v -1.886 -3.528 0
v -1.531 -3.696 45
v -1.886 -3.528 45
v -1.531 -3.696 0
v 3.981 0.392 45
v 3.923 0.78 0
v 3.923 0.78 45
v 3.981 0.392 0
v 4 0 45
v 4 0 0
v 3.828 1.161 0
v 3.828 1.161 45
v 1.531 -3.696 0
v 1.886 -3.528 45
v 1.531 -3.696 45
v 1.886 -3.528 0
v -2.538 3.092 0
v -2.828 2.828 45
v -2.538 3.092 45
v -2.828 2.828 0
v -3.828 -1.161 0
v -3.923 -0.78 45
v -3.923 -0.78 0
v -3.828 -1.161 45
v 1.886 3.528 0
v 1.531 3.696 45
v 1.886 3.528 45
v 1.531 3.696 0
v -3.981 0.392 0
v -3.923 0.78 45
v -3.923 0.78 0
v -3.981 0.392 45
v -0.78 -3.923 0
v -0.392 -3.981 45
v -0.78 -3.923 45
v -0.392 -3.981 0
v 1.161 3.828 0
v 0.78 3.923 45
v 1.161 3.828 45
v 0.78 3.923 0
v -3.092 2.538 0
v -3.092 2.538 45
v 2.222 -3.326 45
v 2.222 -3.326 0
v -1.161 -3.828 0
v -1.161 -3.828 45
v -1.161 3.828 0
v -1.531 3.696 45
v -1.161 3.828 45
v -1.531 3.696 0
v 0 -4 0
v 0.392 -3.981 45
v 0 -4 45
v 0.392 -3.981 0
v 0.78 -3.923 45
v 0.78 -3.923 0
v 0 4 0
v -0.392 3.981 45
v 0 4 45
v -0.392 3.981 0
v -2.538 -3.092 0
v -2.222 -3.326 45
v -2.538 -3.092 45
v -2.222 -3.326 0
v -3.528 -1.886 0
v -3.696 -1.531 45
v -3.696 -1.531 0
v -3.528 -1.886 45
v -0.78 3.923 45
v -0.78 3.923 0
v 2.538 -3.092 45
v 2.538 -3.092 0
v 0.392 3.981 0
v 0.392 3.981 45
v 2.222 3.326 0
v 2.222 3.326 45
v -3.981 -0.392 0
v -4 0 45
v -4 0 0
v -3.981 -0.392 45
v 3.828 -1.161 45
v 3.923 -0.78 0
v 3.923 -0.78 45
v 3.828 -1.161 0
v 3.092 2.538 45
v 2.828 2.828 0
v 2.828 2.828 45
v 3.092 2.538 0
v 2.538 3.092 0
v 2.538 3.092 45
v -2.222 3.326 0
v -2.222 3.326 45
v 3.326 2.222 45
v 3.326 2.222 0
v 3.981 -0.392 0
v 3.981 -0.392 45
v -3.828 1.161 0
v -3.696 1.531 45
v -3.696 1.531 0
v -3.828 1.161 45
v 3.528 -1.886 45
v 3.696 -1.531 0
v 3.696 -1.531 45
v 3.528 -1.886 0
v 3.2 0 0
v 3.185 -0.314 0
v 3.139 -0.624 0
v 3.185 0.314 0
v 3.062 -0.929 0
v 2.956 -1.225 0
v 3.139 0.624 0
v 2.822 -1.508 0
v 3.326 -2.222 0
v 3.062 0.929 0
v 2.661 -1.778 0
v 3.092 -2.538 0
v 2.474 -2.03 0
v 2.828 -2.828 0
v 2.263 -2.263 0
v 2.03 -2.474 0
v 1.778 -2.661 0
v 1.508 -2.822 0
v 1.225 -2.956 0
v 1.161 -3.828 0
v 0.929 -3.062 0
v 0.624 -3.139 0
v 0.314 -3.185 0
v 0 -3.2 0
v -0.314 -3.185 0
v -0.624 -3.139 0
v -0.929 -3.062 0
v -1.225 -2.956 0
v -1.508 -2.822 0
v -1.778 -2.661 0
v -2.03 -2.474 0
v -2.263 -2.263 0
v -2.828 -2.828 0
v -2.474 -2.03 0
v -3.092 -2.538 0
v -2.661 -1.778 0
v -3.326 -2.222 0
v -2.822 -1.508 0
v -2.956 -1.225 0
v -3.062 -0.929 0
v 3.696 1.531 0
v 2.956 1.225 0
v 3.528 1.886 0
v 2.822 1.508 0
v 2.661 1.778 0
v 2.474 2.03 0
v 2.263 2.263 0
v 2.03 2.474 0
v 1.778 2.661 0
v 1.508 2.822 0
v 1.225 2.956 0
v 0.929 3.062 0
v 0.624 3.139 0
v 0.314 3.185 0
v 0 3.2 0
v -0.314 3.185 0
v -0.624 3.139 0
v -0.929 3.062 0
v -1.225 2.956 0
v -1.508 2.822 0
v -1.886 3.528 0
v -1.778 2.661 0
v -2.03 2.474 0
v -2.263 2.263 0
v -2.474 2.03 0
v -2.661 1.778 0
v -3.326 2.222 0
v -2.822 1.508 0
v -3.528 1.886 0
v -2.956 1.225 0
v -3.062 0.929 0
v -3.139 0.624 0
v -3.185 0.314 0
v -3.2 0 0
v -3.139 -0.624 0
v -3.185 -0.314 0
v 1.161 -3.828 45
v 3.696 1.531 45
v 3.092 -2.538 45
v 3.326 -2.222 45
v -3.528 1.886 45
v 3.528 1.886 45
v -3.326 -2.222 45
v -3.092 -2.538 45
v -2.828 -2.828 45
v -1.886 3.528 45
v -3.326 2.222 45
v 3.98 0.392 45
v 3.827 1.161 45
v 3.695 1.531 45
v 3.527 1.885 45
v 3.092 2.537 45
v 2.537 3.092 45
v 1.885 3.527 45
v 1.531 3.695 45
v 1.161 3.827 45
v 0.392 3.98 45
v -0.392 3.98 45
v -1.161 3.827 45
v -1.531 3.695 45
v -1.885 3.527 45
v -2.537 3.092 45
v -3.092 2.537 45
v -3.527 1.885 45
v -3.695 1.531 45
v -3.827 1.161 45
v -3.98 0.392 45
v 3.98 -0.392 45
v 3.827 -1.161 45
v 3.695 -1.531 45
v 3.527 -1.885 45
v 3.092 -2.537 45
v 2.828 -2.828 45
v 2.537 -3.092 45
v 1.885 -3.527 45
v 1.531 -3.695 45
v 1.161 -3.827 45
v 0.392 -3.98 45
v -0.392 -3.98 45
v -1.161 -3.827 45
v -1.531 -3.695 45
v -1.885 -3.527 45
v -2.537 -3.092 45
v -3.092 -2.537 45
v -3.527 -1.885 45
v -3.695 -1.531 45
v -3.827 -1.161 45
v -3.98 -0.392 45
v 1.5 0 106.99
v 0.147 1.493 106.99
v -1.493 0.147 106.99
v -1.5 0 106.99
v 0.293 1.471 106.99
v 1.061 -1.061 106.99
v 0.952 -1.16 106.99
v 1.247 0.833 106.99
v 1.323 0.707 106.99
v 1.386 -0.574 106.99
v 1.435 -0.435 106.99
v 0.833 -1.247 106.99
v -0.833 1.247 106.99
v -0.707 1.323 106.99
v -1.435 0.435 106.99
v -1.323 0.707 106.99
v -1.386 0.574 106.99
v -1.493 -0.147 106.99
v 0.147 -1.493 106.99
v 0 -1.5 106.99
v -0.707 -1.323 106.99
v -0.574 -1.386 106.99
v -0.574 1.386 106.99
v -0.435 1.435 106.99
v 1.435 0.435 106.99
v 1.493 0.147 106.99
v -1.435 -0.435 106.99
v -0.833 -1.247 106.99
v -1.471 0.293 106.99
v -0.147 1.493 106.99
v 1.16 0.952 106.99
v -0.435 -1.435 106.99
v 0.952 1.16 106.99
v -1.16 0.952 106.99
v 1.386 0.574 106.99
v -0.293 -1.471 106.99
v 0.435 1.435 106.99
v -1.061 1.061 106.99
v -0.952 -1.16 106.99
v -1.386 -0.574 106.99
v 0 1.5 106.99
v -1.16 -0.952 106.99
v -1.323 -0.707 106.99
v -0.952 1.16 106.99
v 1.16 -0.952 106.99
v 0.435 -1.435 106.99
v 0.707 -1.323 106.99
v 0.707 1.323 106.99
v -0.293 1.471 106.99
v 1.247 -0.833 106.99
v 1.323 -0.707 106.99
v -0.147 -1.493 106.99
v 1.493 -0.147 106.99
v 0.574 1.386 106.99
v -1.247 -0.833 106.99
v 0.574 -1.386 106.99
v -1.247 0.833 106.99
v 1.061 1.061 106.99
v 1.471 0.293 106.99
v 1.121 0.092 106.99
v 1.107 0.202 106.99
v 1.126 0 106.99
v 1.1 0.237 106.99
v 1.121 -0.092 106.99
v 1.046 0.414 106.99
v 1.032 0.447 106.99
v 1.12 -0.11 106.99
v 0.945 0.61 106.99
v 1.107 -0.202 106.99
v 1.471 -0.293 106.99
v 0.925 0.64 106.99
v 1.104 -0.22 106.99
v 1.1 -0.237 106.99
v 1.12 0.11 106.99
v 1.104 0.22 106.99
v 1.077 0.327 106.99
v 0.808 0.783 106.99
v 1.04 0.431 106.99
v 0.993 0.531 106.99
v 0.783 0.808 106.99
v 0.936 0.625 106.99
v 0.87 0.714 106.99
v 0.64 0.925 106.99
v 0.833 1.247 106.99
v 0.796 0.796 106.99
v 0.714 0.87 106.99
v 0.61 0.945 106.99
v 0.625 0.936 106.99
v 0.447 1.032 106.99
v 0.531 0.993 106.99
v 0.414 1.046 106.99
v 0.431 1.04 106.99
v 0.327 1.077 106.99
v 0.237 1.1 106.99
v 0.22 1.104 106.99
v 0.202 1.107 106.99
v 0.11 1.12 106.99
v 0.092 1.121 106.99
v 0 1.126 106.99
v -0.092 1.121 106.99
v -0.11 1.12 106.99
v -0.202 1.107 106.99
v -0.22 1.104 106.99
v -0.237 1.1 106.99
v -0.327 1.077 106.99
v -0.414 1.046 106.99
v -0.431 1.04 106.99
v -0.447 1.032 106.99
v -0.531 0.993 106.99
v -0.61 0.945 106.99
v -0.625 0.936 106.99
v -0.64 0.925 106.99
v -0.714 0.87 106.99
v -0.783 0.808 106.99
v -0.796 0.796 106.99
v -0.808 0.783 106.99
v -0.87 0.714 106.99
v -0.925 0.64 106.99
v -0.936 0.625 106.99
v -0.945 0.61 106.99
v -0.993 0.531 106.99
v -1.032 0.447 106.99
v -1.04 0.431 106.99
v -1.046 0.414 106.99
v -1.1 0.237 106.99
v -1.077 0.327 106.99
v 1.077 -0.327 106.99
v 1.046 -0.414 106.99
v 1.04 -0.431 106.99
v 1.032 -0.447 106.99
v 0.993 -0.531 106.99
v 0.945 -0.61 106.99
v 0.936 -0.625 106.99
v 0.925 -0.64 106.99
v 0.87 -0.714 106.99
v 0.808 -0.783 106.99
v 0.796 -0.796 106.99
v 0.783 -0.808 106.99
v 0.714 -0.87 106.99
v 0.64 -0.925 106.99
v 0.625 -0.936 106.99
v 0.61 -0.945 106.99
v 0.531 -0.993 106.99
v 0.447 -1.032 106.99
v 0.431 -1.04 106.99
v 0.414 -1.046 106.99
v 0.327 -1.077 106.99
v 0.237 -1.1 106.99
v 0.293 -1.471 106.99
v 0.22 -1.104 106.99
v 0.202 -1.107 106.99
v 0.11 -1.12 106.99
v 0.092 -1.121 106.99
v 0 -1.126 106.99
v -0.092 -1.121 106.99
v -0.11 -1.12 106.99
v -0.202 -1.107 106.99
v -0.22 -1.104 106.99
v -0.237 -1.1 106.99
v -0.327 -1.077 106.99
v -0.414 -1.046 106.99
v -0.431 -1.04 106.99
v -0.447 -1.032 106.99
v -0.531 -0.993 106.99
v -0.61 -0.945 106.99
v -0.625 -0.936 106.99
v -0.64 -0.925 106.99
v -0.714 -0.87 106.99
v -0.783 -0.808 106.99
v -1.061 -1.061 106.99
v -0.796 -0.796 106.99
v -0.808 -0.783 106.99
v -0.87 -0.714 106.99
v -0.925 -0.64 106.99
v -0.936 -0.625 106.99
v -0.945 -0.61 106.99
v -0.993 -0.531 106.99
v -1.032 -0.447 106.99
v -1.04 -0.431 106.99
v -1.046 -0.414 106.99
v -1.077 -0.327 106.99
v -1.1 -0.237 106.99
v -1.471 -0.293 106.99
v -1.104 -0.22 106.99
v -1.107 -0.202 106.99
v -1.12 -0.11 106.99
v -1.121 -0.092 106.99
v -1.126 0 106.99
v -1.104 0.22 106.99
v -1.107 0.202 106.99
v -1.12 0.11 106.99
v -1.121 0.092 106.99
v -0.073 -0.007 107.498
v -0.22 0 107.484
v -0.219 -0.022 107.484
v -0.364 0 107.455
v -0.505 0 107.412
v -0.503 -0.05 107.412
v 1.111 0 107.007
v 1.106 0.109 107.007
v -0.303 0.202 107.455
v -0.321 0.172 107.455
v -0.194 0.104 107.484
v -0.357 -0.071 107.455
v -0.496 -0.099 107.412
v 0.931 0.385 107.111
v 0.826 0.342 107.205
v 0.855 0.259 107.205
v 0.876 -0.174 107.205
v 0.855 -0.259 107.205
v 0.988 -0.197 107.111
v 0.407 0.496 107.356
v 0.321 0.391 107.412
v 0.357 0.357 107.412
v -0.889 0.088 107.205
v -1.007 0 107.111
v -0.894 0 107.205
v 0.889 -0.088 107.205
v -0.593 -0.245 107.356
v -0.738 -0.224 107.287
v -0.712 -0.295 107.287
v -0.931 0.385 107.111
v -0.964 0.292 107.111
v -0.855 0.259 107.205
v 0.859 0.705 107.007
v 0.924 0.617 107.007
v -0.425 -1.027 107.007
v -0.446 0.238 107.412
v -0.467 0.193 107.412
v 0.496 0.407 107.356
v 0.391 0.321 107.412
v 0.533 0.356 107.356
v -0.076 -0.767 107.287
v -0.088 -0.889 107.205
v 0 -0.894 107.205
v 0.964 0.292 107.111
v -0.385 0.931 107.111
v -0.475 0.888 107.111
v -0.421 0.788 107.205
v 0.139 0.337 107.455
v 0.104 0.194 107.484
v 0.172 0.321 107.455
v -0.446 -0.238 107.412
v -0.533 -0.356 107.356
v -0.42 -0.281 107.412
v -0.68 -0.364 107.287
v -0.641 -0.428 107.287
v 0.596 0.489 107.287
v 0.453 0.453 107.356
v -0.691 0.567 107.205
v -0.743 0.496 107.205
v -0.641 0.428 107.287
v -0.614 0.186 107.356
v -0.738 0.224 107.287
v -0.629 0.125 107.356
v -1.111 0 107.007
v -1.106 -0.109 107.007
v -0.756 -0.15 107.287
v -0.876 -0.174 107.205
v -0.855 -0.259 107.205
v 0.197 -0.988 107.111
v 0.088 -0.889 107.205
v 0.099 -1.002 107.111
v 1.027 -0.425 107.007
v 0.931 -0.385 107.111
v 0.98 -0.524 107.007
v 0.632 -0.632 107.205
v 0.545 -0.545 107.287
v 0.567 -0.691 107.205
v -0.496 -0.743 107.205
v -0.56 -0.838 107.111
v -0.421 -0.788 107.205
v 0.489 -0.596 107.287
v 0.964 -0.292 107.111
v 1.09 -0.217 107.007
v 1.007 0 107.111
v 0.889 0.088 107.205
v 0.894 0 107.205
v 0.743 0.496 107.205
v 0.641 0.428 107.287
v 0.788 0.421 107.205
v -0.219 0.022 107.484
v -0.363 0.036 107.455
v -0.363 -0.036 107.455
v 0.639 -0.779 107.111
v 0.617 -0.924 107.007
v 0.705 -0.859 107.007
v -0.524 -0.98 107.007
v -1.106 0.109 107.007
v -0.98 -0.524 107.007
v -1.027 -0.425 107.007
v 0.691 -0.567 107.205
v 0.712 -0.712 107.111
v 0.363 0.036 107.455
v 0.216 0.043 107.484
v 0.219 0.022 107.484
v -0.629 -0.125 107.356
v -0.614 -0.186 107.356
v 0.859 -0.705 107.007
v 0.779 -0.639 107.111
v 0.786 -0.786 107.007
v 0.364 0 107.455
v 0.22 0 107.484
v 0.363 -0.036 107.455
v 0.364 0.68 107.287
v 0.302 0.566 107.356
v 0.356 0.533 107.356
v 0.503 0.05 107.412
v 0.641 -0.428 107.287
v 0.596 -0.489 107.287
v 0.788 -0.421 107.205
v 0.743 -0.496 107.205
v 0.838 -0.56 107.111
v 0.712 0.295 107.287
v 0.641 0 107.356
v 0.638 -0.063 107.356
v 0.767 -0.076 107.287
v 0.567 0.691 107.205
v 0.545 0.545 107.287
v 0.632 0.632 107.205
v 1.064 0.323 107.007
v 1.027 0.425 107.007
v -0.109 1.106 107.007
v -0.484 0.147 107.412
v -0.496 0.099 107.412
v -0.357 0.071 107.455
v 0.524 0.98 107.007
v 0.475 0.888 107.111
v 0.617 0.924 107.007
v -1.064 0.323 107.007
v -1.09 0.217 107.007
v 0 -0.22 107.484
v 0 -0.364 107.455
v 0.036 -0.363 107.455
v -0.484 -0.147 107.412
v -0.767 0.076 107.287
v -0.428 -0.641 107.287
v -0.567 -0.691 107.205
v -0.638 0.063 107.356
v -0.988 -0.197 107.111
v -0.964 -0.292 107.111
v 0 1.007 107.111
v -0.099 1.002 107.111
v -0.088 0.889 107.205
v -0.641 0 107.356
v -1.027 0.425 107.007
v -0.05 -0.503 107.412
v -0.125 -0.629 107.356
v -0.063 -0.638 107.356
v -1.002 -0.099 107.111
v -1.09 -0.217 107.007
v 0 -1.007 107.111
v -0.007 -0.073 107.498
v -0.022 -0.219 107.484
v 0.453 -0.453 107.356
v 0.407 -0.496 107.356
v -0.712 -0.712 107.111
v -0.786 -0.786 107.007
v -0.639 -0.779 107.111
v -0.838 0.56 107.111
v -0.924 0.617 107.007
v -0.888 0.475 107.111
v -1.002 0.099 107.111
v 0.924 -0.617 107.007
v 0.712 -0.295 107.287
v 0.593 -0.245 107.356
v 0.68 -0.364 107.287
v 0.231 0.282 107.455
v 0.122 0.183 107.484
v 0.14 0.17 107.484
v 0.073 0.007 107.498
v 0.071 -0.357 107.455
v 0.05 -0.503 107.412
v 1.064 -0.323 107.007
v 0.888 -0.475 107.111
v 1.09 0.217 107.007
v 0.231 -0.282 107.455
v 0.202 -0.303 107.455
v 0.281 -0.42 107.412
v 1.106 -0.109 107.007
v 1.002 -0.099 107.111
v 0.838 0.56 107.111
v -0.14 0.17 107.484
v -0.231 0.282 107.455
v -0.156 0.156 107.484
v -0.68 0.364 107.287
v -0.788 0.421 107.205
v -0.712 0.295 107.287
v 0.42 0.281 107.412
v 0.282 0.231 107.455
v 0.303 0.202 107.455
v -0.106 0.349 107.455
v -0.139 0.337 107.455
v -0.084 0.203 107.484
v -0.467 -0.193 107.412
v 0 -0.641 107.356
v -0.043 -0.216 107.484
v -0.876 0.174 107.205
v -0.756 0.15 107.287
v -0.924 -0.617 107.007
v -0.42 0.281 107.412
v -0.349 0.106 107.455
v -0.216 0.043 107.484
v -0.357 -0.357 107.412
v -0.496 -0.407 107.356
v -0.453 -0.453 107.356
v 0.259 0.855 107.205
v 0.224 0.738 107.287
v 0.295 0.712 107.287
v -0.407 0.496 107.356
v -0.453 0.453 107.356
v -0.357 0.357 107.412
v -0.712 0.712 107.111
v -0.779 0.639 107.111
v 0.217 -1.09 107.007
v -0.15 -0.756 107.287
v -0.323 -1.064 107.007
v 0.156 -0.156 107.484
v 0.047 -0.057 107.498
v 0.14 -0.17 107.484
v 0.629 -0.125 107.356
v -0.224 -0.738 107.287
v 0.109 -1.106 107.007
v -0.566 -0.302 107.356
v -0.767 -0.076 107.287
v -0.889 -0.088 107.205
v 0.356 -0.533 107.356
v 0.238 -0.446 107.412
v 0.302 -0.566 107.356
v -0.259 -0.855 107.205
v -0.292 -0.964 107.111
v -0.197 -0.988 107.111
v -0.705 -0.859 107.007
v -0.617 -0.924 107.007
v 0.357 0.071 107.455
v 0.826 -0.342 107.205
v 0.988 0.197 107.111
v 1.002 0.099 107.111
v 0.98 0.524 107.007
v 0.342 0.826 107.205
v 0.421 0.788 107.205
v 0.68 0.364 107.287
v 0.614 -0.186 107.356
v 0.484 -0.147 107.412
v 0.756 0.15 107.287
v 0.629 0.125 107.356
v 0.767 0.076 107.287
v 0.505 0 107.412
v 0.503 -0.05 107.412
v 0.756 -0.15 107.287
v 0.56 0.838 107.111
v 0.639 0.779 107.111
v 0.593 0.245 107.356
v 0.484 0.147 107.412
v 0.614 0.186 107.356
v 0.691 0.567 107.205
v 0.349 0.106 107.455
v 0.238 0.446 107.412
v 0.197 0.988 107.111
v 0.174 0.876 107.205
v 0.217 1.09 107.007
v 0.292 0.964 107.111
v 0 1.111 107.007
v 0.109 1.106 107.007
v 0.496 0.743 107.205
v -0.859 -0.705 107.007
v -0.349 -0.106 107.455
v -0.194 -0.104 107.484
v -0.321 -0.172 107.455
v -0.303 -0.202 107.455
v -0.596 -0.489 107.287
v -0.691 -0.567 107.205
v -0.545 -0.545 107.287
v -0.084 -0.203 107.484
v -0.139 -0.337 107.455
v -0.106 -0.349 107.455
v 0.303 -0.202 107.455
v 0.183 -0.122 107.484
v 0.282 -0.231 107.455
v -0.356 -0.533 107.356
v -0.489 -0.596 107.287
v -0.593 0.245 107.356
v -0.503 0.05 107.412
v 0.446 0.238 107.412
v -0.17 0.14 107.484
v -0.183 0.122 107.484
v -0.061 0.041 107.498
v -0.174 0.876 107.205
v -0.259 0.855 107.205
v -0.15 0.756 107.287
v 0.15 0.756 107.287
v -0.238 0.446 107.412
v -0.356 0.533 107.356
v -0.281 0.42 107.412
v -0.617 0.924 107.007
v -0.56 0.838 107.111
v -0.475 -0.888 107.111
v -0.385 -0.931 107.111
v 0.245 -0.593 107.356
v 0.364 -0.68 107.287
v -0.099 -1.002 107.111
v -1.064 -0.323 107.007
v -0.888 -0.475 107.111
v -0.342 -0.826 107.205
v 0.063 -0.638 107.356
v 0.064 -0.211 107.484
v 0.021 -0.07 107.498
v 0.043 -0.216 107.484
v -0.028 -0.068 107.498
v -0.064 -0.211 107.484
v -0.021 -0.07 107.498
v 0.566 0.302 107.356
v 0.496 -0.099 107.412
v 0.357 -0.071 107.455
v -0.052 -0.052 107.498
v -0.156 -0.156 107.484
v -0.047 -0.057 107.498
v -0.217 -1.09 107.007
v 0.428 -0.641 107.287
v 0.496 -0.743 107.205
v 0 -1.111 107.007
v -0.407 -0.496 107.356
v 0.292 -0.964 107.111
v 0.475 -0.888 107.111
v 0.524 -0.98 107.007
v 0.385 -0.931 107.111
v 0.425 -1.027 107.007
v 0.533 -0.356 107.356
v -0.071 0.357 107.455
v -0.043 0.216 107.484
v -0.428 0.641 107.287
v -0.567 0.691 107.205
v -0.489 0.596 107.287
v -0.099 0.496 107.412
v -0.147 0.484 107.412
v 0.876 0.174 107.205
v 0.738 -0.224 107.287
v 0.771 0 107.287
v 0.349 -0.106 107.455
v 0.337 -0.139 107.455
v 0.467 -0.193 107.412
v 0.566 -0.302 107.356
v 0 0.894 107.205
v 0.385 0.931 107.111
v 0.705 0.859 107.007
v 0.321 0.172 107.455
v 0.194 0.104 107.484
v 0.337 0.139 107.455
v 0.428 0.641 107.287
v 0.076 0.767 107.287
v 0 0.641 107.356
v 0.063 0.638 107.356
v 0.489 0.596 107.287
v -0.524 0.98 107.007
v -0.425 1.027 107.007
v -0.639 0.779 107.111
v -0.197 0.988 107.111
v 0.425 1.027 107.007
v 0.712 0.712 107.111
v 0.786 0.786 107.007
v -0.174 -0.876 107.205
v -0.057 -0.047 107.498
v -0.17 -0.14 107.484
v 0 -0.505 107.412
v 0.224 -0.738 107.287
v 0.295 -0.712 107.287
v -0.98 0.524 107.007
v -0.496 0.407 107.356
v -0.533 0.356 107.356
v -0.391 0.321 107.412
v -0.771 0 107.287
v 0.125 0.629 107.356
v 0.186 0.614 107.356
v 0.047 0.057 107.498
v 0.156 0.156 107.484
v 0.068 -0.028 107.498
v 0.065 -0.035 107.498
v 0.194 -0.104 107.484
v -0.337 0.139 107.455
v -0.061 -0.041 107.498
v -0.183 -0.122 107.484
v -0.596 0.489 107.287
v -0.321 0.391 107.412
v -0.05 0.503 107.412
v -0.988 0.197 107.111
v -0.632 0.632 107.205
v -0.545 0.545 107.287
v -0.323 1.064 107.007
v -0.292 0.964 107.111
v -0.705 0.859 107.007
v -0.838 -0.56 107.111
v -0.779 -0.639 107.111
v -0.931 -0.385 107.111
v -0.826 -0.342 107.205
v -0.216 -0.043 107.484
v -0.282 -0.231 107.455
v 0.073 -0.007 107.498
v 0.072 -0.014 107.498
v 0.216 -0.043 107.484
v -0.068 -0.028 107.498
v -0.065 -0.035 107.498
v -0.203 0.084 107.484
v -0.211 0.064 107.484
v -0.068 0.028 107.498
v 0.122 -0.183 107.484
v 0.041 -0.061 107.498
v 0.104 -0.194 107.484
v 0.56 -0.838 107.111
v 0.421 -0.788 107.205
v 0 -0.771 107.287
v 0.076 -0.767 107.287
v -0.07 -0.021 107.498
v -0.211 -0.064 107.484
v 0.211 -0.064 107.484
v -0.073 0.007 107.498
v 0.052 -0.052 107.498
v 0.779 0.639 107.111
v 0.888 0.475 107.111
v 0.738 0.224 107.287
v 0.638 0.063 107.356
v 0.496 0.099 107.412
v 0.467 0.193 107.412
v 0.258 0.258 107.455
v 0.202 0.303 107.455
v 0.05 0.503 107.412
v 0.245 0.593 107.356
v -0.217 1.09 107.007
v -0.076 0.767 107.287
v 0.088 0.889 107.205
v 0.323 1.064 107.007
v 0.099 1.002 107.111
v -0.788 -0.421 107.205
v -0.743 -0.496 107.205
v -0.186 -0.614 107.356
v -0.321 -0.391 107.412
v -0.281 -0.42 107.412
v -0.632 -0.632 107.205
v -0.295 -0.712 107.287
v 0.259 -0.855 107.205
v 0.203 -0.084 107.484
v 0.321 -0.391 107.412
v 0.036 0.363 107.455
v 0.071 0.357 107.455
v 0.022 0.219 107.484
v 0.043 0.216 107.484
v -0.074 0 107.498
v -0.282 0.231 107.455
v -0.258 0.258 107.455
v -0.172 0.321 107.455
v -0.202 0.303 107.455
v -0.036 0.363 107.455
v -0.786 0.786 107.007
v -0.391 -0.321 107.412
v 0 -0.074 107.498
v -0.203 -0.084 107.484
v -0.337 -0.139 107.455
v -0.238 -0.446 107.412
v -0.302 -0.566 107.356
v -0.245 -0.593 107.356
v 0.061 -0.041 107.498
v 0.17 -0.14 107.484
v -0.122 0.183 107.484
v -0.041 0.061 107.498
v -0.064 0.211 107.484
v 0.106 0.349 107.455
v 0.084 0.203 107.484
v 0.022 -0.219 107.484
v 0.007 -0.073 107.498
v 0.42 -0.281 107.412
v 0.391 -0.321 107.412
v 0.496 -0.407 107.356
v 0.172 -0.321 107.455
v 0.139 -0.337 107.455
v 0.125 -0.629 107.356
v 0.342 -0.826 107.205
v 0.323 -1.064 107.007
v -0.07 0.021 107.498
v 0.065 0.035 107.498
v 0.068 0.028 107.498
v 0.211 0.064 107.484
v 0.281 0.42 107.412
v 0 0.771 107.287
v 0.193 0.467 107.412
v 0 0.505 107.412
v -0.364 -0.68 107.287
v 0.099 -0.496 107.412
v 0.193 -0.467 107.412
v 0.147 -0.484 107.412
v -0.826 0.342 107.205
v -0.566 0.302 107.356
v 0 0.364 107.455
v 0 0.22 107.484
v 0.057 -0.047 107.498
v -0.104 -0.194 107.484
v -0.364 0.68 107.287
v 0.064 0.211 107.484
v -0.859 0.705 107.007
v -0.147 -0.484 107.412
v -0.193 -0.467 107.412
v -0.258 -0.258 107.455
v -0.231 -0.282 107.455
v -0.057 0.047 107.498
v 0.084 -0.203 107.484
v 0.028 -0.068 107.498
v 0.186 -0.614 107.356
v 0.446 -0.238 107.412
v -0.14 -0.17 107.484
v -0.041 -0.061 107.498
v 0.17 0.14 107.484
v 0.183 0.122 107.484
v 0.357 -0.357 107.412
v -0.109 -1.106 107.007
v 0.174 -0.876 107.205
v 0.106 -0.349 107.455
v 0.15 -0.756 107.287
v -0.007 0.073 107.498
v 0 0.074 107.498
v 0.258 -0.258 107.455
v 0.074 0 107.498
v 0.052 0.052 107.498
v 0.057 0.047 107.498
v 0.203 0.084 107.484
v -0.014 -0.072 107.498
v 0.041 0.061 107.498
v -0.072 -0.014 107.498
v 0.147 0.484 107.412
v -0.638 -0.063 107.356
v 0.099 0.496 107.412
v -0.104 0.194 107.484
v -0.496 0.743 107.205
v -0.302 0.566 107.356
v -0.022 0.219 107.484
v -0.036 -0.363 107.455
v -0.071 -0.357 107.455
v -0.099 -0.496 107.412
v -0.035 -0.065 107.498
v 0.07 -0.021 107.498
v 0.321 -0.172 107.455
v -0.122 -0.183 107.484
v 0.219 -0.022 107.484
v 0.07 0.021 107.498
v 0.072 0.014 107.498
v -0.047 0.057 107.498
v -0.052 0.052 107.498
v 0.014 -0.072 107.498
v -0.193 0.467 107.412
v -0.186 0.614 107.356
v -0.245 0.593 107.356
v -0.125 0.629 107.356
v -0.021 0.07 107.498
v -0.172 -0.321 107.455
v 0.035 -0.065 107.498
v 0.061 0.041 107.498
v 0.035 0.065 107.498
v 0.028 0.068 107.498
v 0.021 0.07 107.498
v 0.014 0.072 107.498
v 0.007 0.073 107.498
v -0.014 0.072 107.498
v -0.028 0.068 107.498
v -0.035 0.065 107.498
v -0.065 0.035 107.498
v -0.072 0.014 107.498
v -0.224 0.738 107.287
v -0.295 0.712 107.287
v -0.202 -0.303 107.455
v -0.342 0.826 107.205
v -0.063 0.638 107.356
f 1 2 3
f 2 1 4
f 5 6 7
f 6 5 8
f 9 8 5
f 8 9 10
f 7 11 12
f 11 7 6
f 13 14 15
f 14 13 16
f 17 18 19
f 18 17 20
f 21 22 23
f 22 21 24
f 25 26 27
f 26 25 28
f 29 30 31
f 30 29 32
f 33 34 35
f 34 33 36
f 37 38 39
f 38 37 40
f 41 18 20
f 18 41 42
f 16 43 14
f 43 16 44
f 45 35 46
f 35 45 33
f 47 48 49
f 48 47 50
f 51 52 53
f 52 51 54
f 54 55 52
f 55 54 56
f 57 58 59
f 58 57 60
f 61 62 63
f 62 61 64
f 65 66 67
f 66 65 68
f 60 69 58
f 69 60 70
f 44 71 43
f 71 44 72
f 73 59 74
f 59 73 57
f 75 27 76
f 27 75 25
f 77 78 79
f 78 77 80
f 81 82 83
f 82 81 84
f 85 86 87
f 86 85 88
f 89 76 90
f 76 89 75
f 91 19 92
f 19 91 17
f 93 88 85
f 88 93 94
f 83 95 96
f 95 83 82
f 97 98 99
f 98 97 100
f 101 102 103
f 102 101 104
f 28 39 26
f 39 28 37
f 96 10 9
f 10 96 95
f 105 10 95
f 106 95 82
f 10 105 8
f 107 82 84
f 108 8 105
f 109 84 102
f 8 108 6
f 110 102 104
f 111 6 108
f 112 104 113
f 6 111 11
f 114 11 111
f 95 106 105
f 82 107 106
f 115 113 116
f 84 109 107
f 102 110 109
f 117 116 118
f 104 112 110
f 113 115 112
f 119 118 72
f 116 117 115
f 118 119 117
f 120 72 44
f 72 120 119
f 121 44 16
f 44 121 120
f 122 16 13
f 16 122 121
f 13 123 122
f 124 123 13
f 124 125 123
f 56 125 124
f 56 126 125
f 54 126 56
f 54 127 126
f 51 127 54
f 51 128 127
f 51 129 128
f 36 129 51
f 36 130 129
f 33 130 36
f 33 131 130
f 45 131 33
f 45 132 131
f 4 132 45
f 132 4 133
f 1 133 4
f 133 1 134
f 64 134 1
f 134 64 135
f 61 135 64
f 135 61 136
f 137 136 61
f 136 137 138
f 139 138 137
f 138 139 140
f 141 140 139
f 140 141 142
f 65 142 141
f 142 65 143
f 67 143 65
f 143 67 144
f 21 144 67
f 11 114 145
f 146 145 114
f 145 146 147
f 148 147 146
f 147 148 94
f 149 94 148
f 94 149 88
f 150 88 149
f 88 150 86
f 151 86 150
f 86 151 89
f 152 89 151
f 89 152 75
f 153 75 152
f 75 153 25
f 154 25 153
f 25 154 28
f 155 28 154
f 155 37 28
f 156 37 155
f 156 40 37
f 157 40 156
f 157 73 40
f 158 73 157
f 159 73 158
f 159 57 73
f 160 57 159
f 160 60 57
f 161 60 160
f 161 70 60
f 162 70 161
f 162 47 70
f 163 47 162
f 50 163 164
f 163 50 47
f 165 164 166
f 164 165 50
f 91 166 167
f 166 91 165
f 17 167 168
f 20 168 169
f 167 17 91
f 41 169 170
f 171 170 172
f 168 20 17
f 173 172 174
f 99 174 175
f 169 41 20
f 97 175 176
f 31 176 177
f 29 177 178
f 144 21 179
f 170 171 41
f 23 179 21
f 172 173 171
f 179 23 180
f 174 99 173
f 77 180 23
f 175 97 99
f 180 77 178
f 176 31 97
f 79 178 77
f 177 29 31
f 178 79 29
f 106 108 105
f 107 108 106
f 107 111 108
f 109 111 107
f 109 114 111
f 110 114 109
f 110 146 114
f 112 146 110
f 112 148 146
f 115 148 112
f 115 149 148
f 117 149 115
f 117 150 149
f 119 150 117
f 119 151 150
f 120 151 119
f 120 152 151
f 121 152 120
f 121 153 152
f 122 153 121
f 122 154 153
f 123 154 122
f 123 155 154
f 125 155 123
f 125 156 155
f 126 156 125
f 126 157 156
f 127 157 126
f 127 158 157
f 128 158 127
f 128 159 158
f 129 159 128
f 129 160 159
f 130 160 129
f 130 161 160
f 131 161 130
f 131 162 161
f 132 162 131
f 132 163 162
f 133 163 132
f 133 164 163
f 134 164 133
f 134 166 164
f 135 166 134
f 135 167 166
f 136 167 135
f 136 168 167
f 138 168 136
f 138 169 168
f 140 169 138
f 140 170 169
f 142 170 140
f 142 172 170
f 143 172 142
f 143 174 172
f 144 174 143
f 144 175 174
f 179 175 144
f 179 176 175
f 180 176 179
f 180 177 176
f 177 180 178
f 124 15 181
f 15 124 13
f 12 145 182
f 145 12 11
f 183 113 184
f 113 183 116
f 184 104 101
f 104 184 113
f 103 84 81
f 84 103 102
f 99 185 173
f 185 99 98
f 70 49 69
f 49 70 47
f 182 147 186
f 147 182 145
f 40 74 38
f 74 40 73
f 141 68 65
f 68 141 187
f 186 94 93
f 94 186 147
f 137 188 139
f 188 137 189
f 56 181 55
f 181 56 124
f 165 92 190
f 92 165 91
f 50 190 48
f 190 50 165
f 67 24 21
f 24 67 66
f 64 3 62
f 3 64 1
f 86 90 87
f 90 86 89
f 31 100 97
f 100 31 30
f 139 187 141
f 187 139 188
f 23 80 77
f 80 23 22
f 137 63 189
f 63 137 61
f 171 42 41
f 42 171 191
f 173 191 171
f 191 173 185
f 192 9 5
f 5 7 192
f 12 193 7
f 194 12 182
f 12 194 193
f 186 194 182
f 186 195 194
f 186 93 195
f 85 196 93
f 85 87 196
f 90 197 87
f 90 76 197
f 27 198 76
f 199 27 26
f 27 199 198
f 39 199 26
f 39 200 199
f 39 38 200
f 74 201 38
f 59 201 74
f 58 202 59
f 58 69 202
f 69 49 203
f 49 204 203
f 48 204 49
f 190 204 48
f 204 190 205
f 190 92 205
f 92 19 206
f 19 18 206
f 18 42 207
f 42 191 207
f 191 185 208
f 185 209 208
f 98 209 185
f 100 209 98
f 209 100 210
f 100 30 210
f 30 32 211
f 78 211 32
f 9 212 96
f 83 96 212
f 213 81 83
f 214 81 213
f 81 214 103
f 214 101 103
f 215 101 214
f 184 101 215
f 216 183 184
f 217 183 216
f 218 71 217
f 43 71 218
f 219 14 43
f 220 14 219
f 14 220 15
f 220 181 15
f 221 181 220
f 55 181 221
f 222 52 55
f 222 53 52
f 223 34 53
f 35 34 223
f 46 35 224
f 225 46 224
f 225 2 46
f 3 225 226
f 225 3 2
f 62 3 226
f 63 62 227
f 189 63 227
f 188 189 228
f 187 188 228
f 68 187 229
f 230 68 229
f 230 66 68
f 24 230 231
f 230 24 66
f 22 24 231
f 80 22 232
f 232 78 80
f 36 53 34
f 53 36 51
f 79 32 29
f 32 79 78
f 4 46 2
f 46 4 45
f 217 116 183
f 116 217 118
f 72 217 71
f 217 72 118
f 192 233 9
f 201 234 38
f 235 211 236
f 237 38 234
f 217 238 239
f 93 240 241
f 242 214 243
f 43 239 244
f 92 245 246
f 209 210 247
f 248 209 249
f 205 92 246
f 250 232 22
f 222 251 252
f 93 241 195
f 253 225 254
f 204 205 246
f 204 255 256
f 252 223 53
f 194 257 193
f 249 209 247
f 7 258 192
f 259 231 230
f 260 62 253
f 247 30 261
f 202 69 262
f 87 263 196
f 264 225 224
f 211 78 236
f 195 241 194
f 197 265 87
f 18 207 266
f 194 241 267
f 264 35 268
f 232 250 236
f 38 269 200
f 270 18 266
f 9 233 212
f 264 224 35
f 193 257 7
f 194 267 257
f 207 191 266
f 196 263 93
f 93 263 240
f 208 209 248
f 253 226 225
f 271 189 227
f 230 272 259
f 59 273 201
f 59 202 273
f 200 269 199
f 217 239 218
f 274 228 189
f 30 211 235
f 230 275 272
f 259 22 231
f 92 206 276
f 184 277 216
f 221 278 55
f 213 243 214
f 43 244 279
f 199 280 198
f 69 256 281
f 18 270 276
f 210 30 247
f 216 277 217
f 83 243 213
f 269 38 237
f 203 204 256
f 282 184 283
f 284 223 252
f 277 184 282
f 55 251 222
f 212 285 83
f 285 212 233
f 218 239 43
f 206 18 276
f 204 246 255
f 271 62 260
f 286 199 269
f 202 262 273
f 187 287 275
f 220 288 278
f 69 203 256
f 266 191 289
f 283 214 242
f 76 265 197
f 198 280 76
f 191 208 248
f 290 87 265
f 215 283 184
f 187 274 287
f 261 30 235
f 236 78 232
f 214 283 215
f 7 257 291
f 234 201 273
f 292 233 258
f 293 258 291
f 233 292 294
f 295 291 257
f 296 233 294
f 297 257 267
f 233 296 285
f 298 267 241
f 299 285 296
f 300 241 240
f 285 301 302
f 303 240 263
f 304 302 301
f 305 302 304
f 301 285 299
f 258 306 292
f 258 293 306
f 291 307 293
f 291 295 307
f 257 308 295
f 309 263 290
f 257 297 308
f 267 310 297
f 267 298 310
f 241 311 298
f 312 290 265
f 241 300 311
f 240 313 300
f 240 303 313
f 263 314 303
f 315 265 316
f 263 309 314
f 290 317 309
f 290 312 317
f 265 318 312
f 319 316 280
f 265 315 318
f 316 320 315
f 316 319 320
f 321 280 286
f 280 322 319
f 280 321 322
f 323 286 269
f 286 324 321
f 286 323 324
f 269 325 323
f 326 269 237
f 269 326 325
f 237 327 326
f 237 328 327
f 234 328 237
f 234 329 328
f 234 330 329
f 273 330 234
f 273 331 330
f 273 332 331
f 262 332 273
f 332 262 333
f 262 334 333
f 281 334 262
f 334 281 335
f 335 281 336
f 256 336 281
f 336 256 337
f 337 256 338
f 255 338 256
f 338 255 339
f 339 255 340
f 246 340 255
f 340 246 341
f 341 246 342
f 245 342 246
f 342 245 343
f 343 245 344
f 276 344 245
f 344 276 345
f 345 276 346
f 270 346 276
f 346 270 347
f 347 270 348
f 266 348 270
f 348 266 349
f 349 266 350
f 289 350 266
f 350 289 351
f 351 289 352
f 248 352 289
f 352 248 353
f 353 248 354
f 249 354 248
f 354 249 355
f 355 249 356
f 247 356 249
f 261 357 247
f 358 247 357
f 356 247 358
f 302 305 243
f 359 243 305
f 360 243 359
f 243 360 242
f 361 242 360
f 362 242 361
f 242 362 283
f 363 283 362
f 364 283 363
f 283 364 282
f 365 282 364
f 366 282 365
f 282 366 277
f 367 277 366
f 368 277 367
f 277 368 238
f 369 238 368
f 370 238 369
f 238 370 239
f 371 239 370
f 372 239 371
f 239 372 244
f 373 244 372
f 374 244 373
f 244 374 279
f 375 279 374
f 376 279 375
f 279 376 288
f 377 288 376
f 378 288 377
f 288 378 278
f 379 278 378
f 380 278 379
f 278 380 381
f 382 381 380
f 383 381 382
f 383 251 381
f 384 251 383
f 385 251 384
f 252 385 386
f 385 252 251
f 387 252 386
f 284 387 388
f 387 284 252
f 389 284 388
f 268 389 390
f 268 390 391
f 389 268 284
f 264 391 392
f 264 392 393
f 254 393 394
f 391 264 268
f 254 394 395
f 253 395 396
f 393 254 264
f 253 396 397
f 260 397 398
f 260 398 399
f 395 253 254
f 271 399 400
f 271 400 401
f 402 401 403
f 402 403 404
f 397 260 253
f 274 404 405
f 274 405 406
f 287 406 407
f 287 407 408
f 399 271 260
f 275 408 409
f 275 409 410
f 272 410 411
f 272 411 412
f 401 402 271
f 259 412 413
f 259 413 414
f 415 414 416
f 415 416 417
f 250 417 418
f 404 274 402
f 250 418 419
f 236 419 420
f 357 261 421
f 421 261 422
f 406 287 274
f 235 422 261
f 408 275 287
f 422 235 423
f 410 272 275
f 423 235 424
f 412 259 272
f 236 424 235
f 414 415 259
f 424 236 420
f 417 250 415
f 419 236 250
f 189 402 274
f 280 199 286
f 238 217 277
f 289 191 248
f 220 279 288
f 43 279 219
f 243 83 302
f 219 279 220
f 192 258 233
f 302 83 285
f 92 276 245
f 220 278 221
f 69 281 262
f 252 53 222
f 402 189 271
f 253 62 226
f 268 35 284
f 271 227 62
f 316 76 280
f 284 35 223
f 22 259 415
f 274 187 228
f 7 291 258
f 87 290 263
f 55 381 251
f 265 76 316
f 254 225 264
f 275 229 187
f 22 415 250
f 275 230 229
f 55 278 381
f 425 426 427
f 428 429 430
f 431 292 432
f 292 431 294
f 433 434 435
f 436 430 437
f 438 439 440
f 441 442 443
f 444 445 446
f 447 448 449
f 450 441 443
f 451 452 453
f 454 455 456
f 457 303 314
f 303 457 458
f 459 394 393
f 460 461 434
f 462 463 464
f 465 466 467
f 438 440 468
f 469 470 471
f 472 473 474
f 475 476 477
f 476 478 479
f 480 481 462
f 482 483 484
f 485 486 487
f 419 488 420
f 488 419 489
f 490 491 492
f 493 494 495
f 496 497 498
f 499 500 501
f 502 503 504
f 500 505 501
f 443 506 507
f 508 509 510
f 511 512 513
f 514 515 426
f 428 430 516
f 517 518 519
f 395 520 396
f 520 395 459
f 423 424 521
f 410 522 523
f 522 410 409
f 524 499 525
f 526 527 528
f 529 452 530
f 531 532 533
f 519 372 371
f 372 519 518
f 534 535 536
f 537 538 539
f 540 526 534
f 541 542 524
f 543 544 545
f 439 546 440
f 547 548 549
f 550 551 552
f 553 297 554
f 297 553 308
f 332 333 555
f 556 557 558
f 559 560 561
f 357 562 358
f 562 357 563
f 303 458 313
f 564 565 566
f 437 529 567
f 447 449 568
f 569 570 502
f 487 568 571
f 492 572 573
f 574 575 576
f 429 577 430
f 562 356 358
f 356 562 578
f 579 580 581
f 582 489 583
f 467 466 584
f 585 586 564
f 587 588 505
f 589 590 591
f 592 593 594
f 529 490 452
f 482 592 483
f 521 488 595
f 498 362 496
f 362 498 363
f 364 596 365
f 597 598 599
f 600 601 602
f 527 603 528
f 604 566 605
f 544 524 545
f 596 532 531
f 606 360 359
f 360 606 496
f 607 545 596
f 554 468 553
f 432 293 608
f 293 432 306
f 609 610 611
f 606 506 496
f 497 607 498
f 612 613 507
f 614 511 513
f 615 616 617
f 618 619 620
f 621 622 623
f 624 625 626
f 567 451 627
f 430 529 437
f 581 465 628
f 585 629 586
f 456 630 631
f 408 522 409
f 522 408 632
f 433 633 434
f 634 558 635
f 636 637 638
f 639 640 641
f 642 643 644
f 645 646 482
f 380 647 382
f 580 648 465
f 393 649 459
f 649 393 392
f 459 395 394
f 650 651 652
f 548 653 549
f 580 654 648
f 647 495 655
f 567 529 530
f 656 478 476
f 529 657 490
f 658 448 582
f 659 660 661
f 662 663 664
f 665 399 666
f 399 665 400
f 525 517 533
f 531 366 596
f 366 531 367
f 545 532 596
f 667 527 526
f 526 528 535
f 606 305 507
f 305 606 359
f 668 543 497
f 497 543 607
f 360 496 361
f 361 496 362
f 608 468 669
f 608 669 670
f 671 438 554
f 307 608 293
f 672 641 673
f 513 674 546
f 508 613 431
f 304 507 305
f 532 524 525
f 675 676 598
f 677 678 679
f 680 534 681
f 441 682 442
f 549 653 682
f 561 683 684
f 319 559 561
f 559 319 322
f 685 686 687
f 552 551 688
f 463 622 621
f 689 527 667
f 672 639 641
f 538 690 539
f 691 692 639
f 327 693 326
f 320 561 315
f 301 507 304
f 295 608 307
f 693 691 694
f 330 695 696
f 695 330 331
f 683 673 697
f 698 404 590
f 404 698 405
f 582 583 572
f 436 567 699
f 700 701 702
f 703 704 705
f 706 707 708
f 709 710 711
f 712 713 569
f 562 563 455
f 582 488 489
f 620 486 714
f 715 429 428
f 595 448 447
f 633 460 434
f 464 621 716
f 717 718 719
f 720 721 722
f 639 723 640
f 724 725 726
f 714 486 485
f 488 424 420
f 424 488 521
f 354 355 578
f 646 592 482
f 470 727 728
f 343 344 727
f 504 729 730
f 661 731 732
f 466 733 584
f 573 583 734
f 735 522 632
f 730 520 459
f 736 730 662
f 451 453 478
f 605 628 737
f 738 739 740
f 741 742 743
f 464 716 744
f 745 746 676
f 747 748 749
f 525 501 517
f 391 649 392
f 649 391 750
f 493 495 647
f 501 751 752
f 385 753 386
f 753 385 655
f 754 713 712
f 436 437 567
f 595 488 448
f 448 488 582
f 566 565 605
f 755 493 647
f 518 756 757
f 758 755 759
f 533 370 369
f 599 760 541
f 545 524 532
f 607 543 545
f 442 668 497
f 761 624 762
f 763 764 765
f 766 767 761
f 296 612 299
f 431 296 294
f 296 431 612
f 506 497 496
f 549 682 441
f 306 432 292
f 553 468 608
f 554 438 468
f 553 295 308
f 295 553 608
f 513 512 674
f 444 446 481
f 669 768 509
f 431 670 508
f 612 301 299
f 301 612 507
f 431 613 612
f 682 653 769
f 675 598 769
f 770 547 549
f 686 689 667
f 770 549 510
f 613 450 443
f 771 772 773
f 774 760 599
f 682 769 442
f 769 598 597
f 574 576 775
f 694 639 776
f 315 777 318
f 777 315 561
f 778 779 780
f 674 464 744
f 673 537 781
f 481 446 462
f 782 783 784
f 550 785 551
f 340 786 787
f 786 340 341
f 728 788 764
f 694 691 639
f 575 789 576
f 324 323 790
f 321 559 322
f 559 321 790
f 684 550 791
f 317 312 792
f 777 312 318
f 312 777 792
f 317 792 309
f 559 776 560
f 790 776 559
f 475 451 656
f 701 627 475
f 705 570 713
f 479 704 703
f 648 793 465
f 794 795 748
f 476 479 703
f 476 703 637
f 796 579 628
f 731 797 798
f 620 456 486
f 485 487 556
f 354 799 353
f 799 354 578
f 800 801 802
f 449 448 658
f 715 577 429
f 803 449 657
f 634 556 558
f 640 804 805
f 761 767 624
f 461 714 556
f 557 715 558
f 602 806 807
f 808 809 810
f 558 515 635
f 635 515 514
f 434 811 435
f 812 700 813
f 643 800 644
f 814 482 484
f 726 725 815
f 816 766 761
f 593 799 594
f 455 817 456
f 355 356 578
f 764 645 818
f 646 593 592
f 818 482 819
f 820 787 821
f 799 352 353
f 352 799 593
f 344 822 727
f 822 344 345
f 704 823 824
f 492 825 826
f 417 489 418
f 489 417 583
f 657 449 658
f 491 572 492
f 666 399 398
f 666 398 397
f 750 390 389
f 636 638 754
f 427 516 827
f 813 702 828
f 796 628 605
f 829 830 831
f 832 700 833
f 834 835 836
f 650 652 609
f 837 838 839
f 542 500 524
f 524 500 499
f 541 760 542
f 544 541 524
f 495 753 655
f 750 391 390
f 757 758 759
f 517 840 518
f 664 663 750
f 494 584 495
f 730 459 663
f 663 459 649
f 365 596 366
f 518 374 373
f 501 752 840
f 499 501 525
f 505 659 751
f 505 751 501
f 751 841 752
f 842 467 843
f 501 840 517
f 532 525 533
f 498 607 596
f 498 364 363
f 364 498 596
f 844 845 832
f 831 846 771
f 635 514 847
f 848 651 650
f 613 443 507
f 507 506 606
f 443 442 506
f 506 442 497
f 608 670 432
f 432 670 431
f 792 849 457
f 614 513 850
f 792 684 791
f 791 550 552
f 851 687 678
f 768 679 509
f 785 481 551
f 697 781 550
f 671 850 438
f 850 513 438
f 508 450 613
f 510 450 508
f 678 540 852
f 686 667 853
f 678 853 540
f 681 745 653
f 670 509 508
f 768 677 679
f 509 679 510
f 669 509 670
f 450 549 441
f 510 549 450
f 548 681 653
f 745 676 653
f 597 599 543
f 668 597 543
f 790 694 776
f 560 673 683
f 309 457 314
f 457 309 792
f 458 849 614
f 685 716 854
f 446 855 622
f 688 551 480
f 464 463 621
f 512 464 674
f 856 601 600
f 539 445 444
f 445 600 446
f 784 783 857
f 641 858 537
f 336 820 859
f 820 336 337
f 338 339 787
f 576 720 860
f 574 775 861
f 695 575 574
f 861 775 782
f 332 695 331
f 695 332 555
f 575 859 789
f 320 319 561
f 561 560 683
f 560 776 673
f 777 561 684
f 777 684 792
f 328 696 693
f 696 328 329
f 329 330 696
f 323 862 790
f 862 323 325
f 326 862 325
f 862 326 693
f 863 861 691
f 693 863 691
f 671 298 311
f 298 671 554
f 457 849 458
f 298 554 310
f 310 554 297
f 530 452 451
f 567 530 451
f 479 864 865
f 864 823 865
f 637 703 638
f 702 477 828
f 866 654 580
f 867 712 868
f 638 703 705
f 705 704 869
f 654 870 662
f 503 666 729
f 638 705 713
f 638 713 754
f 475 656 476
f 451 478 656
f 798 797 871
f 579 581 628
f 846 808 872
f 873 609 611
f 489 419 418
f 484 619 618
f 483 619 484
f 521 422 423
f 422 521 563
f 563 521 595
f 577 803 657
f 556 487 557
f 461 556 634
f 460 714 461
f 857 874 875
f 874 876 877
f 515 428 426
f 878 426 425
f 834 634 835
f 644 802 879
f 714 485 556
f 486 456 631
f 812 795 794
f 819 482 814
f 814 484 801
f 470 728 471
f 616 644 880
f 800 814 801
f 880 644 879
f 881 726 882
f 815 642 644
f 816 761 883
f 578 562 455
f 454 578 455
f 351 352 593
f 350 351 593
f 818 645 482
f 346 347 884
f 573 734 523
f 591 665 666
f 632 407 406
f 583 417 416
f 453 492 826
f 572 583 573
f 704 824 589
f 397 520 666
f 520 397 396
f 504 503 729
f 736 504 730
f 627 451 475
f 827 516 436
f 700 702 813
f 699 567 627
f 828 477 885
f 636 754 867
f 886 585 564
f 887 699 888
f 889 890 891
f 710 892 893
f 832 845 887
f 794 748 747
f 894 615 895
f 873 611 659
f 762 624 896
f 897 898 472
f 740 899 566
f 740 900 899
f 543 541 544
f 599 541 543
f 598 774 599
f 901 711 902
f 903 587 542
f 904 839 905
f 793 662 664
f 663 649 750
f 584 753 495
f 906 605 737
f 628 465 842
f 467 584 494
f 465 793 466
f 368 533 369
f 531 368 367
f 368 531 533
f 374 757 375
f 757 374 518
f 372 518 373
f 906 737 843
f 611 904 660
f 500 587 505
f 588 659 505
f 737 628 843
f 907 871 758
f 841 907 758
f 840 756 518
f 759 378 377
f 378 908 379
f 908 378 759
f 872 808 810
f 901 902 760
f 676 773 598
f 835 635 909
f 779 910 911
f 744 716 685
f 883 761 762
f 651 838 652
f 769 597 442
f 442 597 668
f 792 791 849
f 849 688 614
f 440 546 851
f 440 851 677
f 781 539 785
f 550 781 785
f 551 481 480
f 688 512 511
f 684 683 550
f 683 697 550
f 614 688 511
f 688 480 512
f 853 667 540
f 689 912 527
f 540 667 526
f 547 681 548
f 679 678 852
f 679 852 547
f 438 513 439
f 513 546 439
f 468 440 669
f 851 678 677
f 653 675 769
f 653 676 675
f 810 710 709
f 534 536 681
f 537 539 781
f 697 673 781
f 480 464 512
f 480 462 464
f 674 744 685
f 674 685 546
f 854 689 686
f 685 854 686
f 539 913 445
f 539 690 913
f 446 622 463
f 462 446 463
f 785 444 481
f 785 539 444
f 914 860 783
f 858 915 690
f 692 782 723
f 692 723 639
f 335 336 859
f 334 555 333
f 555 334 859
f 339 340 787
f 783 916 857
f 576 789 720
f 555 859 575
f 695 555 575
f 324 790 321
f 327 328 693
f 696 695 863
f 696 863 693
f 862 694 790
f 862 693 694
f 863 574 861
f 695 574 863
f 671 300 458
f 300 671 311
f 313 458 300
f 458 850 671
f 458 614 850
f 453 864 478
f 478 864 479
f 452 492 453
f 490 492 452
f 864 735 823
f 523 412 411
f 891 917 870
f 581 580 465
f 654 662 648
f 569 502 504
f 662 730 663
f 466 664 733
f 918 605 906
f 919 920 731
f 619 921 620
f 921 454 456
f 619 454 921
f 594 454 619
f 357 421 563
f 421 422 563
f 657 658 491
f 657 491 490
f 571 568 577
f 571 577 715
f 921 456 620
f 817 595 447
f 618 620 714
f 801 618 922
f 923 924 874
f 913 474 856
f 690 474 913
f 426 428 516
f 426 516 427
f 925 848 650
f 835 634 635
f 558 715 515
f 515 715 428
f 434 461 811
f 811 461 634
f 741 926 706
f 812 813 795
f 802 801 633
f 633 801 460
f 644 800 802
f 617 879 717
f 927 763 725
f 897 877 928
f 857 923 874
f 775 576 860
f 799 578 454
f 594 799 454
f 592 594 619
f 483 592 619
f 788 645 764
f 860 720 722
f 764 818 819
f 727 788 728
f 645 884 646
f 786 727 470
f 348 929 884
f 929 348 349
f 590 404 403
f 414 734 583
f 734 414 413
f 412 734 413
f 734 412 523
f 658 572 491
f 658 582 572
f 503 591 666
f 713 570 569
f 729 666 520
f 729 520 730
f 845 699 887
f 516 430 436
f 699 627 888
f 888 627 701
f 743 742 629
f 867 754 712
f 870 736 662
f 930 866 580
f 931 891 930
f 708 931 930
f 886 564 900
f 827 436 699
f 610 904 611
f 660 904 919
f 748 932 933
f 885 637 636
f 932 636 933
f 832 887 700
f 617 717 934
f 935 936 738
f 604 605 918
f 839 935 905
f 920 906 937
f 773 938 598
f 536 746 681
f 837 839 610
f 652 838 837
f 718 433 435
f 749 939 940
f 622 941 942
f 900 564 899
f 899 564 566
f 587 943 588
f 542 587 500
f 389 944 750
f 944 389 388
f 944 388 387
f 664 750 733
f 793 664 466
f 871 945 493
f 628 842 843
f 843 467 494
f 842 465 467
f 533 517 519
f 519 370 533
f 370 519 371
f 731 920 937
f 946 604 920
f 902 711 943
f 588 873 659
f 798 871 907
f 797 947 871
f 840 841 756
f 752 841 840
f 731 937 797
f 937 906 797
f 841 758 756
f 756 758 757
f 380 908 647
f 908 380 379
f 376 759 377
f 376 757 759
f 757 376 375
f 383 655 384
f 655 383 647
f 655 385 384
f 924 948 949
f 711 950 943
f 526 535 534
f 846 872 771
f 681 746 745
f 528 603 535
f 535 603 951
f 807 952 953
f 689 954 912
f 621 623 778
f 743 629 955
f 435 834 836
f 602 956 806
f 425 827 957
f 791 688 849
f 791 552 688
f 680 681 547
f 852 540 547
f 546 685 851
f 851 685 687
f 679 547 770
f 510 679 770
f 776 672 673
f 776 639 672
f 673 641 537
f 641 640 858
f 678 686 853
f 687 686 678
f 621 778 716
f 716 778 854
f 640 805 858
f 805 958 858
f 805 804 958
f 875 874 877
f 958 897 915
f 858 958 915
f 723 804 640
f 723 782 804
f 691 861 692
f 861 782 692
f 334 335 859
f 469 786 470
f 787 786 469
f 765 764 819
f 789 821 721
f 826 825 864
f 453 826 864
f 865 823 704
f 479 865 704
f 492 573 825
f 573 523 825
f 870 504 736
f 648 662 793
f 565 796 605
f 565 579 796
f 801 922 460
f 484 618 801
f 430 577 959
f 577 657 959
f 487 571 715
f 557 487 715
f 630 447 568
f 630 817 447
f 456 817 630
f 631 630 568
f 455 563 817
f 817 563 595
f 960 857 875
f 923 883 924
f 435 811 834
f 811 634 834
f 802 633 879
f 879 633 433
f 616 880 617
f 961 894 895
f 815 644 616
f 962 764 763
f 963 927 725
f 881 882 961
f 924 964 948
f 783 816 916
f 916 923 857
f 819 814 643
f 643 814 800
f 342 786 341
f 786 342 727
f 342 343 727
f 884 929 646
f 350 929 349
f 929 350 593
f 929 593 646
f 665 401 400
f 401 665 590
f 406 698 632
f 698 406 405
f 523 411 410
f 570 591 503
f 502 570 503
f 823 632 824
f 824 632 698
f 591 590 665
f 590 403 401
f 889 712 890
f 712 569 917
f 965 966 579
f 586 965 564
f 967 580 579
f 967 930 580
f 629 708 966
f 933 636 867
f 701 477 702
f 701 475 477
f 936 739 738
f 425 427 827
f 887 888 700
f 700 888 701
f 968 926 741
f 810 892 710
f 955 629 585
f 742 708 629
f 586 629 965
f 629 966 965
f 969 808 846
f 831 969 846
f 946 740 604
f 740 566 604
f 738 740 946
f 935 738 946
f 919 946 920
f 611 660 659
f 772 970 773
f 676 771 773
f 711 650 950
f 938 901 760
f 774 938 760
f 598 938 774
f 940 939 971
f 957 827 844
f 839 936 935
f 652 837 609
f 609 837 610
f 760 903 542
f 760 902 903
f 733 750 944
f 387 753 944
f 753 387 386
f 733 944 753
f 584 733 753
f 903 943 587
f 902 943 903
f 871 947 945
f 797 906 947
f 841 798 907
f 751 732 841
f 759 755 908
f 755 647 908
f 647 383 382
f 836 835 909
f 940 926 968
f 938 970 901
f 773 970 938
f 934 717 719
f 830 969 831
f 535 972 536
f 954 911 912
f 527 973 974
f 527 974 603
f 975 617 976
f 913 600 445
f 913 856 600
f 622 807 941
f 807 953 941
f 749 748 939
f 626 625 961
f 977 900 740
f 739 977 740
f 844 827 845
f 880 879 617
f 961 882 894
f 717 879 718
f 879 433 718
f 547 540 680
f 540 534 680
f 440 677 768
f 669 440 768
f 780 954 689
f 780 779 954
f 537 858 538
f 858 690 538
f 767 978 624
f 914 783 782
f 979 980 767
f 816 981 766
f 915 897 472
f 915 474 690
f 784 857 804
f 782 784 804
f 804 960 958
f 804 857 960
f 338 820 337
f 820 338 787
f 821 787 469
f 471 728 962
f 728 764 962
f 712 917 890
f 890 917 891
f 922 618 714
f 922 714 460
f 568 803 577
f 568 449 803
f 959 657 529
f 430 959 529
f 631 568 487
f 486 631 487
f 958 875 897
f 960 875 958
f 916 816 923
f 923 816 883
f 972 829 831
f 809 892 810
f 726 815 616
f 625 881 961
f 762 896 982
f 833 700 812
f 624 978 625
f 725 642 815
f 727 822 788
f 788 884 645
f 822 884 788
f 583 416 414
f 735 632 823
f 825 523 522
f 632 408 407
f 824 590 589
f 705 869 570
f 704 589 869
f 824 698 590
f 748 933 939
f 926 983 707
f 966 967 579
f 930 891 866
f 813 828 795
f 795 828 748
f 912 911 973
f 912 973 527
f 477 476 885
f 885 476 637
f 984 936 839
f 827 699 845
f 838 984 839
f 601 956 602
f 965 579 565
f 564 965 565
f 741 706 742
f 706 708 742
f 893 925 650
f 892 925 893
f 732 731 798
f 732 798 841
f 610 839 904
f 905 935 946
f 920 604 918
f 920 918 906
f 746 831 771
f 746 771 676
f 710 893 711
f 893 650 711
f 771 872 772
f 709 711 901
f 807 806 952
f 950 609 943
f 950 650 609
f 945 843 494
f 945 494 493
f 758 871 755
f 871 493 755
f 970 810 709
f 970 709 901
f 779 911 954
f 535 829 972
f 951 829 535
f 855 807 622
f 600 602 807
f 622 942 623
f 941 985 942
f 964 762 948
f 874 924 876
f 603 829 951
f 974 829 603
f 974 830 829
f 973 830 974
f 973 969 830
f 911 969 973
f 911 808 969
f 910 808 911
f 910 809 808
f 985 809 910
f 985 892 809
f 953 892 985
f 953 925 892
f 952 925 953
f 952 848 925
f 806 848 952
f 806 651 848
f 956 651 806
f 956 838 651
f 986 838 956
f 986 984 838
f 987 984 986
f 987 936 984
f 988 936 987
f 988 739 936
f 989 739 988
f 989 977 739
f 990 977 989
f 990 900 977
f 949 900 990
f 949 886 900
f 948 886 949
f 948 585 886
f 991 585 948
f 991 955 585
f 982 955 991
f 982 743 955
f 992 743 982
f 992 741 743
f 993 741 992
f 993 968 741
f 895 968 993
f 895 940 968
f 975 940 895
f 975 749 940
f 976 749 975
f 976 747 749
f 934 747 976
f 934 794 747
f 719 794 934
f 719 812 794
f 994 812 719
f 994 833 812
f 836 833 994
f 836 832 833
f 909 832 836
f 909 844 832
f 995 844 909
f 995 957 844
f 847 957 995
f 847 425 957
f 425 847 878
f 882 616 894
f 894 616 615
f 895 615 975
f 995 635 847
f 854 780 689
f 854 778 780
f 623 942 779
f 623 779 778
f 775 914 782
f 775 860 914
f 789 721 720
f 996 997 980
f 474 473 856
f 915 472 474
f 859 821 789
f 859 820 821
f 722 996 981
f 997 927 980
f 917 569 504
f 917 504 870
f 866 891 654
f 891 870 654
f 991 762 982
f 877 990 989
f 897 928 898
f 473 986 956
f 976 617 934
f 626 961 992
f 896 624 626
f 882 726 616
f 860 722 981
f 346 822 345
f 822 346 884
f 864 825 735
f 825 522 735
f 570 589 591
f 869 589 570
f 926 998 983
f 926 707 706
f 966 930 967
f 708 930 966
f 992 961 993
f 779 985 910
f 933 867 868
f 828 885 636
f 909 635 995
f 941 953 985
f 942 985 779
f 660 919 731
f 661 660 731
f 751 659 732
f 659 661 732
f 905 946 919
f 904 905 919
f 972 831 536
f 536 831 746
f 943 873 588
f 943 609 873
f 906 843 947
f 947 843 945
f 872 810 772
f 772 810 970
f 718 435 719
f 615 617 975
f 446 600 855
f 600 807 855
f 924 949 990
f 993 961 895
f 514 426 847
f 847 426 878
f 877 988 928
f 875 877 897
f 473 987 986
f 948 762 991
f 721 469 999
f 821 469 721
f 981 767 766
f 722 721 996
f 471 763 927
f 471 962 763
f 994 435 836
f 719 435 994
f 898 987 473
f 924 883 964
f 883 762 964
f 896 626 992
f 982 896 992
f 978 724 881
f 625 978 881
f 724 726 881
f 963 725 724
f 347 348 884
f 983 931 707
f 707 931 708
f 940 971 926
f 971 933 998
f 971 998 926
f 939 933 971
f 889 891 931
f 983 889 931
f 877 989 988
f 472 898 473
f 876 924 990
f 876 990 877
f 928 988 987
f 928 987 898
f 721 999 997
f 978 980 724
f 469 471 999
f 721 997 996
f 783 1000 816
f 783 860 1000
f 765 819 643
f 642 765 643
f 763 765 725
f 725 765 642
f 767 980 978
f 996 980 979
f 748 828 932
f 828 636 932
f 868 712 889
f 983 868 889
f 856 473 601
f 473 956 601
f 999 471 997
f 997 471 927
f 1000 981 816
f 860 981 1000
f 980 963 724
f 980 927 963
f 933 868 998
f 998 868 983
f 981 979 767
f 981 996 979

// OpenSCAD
// Lab pestle - a cylindrical handle with grip grooves that tapers into a rounded tip,
// to grind tissue in a microcentrifuge tube. NOVEL general part.
//

tube_d   = 8;
tip_d    = 3;
handle_z = 45;
cone_z   = 62;
groove_h = 2;
groove_d = 1;

$fn = 64;

difference() {
    union() {
        cylinder(h = handle_z, d = tube_d);
        translate([0, 0, handle_z - 0.01]) cylinder(h = cone_z, d1 = tube_d, d2 = tip_d);
        translate([0, 0, handle_z + cone_z - 1]) sphere(d = tip_d);
    }
    for (z = [handle_z * 0.25, handle_z * 0.5, handle_z * 0.75])
        translate([0, 0, -1]) cylinder(h = groove_h, d = tube_d * 0.8, center = true);
}
